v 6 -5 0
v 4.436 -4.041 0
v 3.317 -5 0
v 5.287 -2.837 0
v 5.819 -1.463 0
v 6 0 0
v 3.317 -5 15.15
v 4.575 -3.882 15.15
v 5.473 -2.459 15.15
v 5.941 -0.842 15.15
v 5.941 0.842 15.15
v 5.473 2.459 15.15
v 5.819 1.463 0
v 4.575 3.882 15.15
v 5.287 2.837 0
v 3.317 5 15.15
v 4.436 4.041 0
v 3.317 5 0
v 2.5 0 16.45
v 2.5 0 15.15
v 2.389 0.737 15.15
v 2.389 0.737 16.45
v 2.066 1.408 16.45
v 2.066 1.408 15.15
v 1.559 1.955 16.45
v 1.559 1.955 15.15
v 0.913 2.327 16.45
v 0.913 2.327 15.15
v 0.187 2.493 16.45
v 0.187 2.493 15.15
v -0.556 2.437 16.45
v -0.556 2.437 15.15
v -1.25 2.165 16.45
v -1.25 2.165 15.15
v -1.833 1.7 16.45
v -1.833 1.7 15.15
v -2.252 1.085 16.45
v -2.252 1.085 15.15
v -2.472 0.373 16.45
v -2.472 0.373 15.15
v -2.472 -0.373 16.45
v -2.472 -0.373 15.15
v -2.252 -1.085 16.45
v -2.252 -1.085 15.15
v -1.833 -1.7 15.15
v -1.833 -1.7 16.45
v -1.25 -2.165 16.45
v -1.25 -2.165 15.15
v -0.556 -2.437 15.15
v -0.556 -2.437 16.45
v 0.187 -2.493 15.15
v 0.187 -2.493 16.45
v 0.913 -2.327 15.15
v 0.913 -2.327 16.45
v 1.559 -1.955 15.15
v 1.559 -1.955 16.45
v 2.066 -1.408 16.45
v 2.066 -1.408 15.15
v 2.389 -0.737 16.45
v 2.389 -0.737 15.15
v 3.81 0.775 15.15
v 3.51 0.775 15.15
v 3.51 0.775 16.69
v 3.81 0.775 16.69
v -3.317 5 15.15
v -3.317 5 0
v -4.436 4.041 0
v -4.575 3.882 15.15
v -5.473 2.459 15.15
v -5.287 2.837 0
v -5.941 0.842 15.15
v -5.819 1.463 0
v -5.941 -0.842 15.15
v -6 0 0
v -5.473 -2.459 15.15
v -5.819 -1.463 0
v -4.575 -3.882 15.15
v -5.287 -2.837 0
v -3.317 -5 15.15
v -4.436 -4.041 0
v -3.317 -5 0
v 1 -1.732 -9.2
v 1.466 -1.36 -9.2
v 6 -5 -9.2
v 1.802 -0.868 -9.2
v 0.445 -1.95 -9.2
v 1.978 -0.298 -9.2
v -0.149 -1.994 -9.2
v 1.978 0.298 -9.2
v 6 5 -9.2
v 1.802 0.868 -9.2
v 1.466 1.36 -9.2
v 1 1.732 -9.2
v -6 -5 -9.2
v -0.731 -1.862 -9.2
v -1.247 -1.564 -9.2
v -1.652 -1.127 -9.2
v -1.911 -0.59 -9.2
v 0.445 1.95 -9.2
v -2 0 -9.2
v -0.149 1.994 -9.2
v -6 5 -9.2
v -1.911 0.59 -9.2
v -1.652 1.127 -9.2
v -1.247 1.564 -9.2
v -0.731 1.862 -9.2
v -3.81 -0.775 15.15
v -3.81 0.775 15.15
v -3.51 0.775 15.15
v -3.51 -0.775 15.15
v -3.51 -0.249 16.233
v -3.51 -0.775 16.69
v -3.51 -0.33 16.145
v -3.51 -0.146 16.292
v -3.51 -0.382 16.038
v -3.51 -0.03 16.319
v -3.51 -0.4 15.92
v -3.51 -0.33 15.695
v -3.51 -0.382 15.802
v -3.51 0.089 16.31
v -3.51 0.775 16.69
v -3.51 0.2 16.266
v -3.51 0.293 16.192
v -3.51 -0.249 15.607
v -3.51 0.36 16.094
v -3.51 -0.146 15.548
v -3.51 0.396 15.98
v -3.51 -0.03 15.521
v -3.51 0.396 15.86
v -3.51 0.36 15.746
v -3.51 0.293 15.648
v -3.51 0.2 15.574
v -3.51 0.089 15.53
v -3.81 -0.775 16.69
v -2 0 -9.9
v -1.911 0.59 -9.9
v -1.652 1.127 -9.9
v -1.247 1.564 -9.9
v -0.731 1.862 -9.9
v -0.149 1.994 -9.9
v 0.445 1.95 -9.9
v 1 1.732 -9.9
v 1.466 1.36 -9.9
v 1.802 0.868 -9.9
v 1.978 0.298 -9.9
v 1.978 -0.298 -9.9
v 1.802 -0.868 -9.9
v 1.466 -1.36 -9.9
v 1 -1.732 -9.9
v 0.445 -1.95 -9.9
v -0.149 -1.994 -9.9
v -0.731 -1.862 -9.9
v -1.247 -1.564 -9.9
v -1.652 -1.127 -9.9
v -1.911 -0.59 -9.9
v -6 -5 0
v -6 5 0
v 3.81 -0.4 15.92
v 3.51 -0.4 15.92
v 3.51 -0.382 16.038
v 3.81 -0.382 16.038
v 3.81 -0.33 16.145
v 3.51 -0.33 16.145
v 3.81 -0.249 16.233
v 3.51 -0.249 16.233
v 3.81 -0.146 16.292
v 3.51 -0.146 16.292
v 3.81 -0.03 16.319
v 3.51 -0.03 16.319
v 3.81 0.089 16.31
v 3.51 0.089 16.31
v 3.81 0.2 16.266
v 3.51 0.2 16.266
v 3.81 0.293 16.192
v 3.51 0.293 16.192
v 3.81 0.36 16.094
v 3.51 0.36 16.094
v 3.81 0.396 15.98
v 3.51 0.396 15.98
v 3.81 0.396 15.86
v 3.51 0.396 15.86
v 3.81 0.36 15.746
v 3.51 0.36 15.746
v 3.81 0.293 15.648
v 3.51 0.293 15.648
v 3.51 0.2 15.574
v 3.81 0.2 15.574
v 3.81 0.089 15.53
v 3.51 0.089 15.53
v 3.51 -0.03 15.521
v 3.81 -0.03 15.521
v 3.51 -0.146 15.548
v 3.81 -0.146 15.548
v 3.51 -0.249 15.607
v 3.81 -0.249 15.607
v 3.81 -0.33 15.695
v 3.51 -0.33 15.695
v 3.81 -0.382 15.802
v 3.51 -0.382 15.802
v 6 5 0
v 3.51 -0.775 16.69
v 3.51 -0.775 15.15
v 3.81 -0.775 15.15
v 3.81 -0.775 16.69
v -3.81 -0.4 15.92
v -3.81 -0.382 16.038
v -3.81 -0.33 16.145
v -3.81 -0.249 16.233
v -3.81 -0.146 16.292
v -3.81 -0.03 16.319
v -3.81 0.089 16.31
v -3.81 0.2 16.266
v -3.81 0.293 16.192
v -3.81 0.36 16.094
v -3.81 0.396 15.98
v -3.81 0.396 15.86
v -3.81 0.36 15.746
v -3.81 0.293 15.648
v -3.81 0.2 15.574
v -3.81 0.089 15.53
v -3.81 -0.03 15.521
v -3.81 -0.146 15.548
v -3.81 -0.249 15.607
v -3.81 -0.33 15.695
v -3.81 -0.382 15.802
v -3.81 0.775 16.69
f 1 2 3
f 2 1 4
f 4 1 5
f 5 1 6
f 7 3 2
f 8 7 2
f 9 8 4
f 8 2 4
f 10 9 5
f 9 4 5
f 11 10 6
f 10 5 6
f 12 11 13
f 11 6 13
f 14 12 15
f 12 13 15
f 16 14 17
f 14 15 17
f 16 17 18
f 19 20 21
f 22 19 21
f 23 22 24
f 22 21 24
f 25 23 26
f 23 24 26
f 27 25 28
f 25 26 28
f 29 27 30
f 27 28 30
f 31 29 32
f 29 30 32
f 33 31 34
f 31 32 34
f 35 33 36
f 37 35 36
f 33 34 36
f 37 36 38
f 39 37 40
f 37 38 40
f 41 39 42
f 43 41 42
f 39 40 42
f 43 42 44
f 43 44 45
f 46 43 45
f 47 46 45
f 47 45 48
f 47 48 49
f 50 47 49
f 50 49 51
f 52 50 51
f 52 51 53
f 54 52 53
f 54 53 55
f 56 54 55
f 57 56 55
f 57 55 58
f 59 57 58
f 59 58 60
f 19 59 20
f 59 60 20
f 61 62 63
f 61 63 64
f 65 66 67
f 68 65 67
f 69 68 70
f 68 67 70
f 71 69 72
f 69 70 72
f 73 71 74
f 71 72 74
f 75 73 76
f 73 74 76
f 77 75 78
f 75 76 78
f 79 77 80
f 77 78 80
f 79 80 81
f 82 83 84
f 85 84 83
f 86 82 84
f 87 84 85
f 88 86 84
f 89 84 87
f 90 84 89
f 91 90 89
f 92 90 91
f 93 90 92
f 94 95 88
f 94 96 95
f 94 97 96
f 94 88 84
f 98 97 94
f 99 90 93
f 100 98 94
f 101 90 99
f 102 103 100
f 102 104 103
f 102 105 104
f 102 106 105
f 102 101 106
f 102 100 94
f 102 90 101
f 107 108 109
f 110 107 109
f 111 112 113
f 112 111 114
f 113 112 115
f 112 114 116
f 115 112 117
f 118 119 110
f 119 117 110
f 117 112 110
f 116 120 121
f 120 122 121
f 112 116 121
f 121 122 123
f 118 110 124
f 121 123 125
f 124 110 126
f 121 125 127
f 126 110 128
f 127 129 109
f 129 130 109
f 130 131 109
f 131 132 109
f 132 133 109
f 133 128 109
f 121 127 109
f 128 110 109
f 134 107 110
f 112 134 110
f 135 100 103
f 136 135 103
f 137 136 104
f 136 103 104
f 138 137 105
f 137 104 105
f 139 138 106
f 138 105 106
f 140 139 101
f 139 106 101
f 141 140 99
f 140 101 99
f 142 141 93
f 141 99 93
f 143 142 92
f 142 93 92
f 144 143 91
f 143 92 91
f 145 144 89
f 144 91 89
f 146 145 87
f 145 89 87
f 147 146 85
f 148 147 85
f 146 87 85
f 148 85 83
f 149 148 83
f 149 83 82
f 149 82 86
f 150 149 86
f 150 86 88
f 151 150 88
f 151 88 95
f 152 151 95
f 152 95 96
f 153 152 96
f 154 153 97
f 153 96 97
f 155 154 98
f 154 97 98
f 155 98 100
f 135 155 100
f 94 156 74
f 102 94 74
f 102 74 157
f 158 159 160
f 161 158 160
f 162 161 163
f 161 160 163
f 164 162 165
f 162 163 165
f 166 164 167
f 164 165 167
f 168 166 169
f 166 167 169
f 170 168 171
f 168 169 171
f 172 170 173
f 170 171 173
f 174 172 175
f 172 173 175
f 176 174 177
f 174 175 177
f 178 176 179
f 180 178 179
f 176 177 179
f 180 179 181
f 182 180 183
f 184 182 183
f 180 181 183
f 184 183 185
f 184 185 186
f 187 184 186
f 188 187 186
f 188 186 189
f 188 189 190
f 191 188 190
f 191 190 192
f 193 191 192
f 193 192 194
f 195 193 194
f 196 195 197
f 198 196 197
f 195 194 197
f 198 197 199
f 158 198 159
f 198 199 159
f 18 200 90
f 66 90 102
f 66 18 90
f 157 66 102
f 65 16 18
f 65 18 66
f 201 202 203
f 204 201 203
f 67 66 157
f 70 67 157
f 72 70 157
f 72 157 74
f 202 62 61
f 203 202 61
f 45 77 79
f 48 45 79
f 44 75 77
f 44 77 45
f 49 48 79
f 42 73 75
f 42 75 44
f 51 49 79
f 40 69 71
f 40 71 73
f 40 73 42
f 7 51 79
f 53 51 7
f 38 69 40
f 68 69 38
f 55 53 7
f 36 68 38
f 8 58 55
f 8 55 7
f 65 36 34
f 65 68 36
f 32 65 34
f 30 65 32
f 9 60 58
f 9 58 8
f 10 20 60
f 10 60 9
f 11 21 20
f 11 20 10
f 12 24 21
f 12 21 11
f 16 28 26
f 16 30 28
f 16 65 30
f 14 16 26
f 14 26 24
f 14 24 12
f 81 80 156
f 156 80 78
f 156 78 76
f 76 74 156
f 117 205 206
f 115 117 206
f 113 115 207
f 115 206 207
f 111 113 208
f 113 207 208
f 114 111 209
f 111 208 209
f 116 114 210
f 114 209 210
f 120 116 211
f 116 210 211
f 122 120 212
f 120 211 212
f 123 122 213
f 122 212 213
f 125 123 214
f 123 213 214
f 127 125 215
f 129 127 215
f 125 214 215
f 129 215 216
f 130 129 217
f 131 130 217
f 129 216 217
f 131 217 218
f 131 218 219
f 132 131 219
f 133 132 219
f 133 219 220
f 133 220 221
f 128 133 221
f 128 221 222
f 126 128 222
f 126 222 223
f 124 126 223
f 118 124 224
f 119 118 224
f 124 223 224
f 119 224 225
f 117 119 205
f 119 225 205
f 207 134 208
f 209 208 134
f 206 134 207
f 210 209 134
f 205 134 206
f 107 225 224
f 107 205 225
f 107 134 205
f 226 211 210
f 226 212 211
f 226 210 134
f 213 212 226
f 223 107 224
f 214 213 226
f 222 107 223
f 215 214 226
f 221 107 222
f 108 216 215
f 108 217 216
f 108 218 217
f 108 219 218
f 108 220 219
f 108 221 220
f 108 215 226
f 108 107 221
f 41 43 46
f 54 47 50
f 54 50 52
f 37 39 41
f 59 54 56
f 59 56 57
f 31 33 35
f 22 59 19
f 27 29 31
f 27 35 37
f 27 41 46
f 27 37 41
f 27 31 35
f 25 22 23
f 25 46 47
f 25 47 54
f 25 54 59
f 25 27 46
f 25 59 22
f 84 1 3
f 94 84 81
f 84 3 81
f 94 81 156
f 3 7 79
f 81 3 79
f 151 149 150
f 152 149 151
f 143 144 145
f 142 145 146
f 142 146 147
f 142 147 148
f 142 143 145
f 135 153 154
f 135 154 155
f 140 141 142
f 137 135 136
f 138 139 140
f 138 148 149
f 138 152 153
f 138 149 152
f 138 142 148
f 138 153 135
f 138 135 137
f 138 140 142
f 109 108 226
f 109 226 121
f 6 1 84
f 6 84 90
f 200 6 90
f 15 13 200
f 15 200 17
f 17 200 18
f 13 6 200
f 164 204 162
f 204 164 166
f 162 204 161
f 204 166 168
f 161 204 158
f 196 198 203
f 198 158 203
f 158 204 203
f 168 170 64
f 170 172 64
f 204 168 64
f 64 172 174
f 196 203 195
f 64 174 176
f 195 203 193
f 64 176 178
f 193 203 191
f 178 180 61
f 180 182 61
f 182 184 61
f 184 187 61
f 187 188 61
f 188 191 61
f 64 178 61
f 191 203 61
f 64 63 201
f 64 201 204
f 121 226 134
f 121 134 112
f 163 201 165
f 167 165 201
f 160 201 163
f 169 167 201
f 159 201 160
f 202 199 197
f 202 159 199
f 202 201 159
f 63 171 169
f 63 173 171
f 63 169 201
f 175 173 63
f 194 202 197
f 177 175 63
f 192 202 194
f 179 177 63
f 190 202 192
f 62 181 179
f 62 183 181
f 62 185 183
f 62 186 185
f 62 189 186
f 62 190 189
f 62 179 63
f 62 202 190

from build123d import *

# Parameters (mm, degrees)
BOSS_EXTRUDE1_DEPTH   = 15.15
SKETCH3_W             = 12
SKETCH3_H             = 10
BOSS_EXTRUDE2_DEPTH   = 9.2
SKETCH4_R             = 2.5
BOSS_EXTRUDE3_DEPTH   = 1.3
SKETCH5_W             = 0.3
SKETCH5_H             = 1.55
BOSS_EXTRUDE4_DEPTH   = 1.54
BOSS_EXTRUDE4_2_DEPTH = 1.54
SKETCH6_R             = 0.4
CUT_EXTRUDE1_DEPTH    = 0.3
SKETCH7_R             = 0.4
CUT_EXTRUDE2_DEPTH    = 0.3
SKETCH8_R             = 2
BOSS_EXTRUDE5_DEPTH   = 0.7


with BuildPart() as part:
    # Sketch1 → Boss-Extrude1 (new body)
    with BuildSketch(Plane.XY):
        with BuildLine():
            Line((3.31662479, 5), (-3.31662479, 5))
            ThreePointArc((-3.31662479, 5), (-6, 0), (-3.31662479, -5))
            Line((-3.31662479, -5), (3.31662479, -5))
            ThreePointArc((3.31662479, -5), (6, 0), (3.31662479, 5))
        make_face()
    extrude(amount=BOSS_EXTRUDE1_DEPTH)

    # Sketch3 → Boss-Extrude2 (add)
    with BuildSketch(Plane(origin=(0, 0, 0), x_dir=(-1, 0, 0), z_dir=(0, 0, -1))):
        Rectangle(SKETCH3_W, SKETCH3_H)
    extrude(amount=BOSS_EXTRUDE2_DEPTH)

    # Sketch4 → Boss-Extrude3 (add)
    with BuildSketch(Plane.XY.offset(15.15)):
        Circle(SKETCH4_R)
    extrude(amount=BOSS_EXTRUDE3_DEPTH)

    # Sketch8 → Boss-Extrude5 (add)
    with BuildSketch(Plane(origin=(0, 0, -9.2), x_dir=(-1, 0, 0), z_dir=(0, 0, -1))):
        Circle(SKETCH8_R)
    extrude(amount=BOSS_EXTRUDE5_DEPTH)


with BuildPart() as body_2:
    # Sketch5 → Boss-Extrude4 (new body)
    with BuildSketch(Plane.XY.offset(15.15)):
        with Locations((-3.66, 0)):
            Rectangle(SKETCH5_W, SKETCH5_H)
    extrude(amount=BOSS_EXTRUDE4_DEPTH)

    # Sketch6 → Cut-Extrude1 (cut)
    with BuildSketch(Plane.ZY.offset(3.81)):
        with Locations(Location((15.92, 0, 0), (0, 0, 270))):
            Circle(SKETCH6_R)
    extrude(amount=-CUT_EXTRUDE1_DEPTH, mode=Mode.SUBTRACT)


with BuildPart() as body_3:
    # Sketch5 → Boss-Extrude4 2 (new body)
    with BuildSketch(Plane.XY.offset(15.15)):
        with Locations((3.66, 0)):
            Rectangle(SKETCH5_W, SKETCH5_H)
    extrude(amount=BOSS_EXTRUDE4_2_DEPTH)

    # Sketch7 → Cut-Extrude2 (cut)
    with BuildSketch(Plane.ZY.offset(-3.51)):
        with Locations(Location((15.92, 0, 0), (0, 0, 270))):
            Circle(SKETCH7_R)
    extrude(amount=-CUT_EXTRUDE2_DEPTH, mode=Mode.SUBTRACT)


solid = Compound([part.part, body_2.part, body_3.part])
